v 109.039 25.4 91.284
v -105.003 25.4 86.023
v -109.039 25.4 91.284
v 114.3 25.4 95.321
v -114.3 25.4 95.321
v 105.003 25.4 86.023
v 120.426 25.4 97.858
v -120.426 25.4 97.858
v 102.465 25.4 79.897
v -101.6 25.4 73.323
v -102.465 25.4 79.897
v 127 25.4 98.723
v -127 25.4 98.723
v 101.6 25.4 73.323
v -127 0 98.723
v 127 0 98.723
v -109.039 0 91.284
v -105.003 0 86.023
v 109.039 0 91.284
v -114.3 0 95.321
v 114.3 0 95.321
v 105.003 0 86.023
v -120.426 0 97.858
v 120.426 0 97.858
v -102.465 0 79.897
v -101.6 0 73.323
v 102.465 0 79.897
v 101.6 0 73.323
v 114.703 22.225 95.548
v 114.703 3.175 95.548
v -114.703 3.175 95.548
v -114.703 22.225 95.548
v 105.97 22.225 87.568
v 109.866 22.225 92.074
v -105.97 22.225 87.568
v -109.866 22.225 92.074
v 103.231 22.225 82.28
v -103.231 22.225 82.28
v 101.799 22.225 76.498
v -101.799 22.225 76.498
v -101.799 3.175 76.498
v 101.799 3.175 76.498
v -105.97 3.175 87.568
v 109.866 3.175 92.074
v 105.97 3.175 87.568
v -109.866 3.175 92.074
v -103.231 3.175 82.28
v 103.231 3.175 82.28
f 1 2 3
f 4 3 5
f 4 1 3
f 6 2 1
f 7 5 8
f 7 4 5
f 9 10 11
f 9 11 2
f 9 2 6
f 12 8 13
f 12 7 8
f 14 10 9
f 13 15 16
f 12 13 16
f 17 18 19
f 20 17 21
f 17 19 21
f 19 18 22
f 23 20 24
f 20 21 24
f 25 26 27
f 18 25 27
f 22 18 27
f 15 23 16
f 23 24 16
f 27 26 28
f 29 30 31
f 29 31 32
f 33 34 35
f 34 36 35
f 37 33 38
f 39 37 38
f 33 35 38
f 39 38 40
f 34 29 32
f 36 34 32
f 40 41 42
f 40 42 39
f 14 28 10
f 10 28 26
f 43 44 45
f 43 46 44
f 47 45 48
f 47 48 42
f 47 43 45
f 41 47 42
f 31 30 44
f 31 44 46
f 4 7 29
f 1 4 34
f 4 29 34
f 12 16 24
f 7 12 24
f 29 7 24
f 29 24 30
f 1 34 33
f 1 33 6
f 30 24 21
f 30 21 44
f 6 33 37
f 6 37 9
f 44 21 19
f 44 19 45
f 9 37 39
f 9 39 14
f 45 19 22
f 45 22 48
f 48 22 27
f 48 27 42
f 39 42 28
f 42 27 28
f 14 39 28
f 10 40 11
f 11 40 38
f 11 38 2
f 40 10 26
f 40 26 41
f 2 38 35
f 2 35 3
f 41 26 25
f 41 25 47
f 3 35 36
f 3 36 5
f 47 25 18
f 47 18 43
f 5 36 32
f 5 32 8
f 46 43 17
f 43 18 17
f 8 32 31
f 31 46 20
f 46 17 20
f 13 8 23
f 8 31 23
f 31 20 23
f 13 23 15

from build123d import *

# Parameters (mm, degrees)
BOSS_EXTRUDE1_DEPTH     = 25.4
CUT_EXTRUDE1_DEPTH      = 163.851117067
CUT_EXTRUDE1_DEPTH_BACK = 163.851117067
SKETCH2_W               = 19.05
SKETCH2_H               = 19.05


with BuildPart() as part:
    # Sketch1 → Boss-Extrude1 (new body)
    with BuildSketch(Plane(origin=(0, 0, 0), x_dir=(1, 0, 0), z_dir=(0, 1, 0))):
        with BuildLine():
            Line((-127, -98.723484187), (127, -98.723484187))
            ThreePointArc((127, -98.723484187), (109.039487758, -91.283996429), (101.6, -73.323484187))
            Line((101.6, -73.323484187), (-101.6, -73.323484187))
            ThreePointArc((-101.6, -73.323484187), (-109.039487758, -91.283996429), (-127, -98.723484187))
        make_face()
    extrude(amount=BOSS_EXTRUDE1_DEPTH)

    # Sketch2 → Cut-Extrude1 (cut, two sides: drawn at the far end of the back side and taken through both)
    with BuildSketch(Plane(origin=(0, 0, 0), x_dir=(0, 0, -1), z_dir=(1, 0, 0)).offset(-CUT_EXTRUDE1_DEPTH_BACK)):
        with Locations((-86.023484187, 12.7)):
            Rectangle(SKETCH2_W, SKETCH2_H)
    extrude(amount=CUT_EXTRUDE1_DEPTH + CUT_EXTRUDE1_DEPTH_BACK, mode=Mode.SUBTRACT)


solid = part.part
